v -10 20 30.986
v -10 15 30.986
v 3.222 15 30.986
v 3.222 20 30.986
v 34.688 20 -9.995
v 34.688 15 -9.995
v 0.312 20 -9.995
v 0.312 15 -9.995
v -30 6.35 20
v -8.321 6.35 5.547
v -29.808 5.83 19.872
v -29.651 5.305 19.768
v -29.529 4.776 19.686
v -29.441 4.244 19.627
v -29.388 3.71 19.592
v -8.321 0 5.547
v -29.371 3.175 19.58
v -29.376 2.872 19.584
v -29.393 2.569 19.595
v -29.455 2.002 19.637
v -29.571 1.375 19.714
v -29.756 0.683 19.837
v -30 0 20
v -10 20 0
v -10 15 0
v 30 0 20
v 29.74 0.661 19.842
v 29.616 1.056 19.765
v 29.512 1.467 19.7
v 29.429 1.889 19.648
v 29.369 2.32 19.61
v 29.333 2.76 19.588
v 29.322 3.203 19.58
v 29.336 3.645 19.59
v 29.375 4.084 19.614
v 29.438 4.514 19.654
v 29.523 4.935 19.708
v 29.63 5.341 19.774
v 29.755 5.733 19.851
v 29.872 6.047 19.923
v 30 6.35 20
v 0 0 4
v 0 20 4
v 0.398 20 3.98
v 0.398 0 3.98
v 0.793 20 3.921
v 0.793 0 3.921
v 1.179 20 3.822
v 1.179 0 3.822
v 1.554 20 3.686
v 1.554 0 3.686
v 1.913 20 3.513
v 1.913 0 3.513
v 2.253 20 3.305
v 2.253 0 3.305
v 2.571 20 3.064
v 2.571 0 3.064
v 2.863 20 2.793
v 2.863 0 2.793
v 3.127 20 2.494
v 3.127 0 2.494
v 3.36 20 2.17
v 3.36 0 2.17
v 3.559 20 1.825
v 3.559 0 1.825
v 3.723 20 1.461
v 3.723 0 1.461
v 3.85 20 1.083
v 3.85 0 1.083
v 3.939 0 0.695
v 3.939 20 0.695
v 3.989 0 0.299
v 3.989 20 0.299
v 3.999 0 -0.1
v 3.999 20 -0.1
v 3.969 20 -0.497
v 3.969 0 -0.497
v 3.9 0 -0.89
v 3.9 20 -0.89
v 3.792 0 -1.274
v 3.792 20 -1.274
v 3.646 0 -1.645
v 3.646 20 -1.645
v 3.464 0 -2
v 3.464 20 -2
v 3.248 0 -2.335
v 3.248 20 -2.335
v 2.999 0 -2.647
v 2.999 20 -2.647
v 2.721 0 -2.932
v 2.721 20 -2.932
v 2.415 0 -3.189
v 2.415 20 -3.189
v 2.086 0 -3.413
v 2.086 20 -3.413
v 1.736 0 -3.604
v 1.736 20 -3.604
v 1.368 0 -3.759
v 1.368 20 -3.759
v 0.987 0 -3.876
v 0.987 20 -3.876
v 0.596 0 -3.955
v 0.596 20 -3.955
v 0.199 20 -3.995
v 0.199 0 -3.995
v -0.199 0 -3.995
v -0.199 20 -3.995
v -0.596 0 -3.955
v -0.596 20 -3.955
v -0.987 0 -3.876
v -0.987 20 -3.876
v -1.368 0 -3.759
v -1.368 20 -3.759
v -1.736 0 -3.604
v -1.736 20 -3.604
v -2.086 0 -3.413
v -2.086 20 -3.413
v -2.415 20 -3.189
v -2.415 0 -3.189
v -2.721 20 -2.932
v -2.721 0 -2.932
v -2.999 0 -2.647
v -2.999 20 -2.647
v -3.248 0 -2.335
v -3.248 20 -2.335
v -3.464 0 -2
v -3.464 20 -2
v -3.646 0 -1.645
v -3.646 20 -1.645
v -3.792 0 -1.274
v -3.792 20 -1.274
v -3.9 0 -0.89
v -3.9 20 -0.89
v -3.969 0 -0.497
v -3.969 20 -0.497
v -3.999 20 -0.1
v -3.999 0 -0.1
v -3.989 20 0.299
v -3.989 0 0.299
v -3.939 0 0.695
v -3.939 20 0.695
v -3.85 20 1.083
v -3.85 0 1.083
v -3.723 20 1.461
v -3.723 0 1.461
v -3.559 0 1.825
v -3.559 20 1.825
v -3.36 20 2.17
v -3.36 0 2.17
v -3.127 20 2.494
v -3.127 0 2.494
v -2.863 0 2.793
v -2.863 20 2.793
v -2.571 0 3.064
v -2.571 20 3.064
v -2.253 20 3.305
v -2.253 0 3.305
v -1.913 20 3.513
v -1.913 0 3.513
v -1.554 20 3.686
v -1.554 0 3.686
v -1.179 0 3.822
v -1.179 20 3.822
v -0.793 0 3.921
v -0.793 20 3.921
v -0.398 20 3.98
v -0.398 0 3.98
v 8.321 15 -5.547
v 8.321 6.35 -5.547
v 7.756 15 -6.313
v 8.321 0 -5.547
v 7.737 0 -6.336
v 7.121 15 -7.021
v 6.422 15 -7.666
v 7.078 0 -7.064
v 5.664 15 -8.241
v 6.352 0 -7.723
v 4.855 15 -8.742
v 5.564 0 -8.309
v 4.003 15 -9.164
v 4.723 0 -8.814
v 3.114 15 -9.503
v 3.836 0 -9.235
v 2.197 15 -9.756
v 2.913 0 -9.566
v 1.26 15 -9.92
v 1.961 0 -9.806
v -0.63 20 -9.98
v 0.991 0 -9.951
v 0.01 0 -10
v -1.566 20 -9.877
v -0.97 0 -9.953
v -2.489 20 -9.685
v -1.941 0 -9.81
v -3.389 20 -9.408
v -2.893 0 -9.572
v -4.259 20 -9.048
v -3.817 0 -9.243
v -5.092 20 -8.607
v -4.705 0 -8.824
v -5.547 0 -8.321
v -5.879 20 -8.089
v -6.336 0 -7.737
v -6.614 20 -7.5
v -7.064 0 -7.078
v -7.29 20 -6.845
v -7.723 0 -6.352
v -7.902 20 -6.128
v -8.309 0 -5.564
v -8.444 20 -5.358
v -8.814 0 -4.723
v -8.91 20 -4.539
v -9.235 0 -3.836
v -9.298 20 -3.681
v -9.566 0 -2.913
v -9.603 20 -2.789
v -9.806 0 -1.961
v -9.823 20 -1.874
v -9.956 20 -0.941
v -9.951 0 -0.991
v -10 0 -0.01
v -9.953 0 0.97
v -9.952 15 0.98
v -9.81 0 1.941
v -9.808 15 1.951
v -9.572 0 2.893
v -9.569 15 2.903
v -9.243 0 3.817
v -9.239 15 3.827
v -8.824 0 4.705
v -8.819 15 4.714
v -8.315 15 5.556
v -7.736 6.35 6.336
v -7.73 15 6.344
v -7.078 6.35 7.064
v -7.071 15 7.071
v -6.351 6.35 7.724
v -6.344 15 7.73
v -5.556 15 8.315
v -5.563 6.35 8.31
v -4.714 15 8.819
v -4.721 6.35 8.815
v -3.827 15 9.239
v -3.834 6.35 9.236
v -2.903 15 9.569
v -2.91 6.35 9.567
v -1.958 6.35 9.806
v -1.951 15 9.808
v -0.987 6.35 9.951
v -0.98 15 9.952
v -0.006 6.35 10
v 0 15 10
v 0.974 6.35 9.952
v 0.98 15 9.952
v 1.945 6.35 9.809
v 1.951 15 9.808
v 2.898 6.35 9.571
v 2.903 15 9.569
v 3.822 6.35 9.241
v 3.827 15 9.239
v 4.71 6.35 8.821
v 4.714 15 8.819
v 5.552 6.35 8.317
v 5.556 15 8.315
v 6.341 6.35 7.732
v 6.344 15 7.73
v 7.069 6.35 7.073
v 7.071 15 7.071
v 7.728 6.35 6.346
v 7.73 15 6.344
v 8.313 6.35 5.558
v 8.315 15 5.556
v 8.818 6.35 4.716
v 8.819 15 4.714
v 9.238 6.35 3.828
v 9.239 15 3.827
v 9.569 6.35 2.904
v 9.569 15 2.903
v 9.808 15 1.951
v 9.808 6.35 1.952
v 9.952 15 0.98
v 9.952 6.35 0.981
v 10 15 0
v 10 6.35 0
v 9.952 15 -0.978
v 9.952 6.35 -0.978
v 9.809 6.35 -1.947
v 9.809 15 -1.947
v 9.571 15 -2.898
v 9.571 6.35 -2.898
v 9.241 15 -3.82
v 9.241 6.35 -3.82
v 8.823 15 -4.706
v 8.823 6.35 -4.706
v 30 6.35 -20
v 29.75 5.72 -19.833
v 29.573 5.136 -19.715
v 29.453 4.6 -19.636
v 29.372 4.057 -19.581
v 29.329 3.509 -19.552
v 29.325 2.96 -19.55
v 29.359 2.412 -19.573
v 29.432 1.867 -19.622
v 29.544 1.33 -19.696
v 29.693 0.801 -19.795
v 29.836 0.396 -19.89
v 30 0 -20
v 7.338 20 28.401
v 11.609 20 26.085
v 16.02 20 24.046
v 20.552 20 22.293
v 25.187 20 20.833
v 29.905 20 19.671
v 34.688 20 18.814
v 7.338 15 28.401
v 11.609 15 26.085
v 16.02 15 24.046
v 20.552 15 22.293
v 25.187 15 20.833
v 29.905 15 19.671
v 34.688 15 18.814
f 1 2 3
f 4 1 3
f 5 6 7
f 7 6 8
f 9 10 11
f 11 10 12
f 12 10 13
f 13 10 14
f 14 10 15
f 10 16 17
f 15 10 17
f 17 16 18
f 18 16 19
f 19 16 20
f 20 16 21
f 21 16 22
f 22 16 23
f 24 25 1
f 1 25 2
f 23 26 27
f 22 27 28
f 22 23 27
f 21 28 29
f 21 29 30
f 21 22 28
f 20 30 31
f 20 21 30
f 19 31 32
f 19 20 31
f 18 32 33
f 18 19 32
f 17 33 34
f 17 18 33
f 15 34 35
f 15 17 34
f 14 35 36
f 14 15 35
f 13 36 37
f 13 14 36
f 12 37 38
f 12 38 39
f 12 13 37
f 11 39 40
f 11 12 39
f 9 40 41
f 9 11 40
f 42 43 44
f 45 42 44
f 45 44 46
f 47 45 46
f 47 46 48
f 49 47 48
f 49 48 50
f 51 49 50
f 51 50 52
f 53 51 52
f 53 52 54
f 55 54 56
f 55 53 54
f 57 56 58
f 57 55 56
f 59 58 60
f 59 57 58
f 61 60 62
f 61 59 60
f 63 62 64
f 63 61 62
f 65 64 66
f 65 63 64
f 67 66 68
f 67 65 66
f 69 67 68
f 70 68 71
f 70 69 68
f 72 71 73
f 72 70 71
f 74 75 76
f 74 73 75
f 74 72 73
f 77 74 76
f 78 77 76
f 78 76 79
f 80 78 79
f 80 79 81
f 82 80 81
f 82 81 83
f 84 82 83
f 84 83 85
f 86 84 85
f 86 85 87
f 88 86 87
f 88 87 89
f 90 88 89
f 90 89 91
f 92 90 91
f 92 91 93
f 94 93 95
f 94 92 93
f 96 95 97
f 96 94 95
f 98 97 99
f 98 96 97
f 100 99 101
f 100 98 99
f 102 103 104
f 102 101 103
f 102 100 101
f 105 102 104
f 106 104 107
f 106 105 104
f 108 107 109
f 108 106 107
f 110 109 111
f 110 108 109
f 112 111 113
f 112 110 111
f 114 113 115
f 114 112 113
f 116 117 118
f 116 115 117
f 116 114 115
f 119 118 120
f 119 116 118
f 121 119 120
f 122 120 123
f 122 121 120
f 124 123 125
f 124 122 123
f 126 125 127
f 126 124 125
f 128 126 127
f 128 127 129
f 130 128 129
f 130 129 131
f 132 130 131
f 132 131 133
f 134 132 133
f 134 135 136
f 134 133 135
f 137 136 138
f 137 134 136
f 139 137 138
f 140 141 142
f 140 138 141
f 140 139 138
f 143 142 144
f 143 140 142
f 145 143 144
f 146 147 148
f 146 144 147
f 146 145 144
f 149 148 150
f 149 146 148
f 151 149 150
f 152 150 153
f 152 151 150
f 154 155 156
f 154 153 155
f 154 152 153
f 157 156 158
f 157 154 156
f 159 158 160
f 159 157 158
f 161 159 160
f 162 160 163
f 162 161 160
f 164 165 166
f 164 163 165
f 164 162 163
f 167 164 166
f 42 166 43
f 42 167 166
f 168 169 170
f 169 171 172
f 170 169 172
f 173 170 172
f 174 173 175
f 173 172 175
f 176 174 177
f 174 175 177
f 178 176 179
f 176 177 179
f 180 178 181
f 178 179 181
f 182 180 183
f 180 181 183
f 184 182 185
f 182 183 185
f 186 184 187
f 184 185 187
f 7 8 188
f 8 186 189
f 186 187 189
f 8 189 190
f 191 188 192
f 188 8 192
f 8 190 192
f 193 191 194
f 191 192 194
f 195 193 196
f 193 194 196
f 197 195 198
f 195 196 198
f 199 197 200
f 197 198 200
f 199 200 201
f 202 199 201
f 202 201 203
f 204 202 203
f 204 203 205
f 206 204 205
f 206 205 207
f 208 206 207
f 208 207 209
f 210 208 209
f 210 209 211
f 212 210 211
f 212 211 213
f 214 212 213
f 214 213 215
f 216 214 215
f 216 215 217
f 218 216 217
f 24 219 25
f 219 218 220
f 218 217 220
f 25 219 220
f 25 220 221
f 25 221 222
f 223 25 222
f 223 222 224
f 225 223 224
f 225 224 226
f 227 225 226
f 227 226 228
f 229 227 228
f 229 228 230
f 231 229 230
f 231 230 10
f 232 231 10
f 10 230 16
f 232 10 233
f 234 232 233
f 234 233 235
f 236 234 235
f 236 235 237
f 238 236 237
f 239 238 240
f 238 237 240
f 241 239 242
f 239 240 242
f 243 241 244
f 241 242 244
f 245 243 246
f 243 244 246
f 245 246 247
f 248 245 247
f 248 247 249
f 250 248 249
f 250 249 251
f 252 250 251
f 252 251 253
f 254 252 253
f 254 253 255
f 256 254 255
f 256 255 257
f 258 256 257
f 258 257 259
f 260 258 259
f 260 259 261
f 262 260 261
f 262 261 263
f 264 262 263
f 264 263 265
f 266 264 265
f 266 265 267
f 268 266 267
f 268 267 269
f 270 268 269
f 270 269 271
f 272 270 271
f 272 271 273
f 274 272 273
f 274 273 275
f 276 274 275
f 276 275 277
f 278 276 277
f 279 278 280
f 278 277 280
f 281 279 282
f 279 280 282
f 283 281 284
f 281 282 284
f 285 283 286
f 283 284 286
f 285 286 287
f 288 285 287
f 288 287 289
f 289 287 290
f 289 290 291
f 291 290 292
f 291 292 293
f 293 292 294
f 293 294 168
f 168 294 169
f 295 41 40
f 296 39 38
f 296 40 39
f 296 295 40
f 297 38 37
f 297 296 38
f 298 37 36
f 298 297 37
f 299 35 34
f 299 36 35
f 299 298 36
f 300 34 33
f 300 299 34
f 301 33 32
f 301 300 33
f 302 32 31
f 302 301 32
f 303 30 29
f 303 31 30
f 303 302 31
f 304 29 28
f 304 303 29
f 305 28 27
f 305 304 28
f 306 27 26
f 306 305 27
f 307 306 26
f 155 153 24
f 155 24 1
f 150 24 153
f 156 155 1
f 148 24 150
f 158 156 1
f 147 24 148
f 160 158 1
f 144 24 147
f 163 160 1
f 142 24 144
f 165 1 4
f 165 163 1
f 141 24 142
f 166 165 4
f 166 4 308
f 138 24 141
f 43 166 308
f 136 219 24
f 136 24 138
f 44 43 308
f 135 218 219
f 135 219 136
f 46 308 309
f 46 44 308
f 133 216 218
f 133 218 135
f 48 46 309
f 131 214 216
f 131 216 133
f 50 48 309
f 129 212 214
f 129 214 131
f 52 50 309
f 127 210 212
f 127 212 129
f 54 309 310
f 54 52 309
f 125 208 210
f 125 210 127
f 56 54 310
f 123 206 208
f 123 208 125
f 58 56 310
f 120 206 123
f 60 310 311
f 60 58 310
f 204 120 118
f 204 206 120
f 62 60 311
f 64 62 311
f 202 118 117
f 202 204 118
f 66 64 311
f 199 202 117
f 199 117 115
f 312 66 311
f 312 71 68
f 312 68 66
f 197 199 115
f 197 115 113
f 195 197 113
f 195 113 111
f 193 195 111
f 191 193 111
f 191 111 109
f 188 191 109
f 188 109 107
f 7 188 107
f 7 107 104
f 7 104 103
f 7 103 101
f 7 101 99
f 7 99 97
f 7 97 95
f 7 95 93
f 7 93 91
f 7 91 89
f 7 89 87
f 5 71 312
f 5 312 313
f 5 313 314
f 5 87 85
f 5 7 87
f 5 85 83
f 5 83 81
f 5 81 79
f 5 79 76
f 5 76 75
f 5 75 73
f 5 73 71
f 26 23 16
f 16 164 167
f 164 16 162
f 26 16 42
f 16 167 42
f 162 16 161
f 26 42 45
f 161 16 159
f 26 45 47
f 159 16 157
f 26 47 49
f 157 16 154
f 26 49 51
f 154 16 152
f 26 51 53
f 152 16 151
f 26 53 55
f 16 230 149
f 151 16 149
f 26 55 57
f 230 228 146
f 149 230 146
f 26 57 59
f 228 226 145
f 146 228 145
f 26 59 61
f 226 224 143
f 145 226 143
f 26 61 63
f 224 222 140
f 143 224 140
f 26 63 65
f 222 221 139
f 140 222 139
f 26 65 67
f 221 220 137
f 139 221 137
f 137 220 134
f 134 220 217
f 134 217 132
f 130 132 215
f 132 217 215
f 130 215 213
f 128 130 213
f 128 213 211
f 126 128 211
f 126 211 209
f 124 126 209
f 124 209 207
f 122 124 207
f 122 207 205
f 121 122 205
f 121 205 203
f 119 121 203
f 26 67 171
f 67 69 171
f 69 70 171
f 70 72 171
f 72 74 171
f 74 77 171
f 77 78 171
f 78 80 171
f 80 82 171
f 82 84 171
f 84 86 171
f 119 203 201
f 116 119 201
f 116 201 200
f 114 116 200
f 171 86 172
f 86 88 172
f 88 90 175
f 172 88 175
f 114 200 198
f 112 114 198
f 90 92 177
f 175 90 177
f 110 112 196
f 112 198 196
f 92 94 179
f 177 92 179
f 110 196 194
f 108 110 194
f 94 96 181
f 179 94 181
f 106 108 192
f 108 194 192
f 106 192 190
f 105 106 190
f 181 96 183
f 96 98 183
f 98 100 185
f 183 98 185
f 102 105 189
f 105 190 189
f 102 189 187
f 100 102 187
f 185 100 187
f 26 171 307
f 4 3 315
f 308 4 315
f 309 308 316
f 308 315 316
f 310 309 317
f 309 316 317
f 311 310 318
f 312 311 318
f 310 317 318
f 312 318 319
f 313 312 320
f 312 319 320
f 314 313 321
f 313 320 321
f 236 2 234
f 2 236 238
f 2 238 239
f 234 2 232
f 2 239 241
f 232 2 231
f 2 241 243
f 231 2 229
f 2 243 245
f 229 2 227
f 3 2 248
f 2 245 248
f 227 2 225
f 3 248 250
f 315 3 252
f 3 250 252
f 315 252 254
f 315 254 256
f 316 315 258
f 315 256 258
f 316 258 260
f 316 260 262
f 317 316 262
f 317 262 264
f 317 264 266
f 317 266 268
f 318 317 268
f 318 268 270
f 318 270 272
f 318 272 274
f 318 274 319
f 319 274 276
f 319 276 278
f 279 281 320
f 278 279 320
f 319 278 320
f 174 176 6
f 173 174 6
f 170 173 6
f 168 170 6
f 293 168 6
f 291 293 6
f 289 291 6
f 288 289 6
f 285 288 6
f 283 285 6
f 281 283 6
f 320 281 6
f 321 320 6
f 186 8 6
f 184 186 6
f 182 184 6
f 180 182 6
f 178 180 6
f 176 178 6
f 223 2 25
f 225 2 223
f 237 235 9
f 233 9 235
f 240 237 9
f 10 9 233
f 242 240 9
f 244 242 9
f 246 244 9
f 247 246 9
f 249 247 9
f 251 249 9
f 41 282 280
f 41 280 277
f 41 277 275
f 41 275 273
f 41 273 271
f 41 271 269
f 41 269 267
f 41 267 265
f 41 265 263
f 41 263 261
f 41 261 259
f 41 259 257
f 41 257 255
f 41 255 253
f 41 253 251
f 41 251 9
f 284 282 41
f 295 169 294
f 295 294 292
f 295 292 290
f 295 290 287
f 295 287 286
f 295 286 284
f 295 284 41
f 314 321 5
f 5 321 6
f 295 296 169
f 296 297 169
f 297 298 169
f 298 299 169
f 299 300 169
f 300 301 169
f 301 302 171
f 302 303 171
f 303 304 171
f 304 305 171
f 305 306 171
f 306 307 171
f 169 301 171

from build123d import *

# Parameters (mm, degrees)
BOSS_EXTRUDE1_DEPTH     = 6.35
SKETCH1_3_R             = 10
SKETCH1_3_R_2           = 4
BOSS_EXTRUDE2_DEPTH     = 20
CUT_EXTRUDE1_DEPTH      = 42.231056256
CUT_EXTRUDE1_DEPTH_BACK = 42.231056256
SKETCH3_R               = 7.768492306
CUT_EXTRUDE3_DEPTH      = 42.231056256
CUT_EXTRUDE3_DEPTH_BACK = 42.231056256
SKETCH4_R               = 12.223418735
BOSS_EXTRUDE3_START     = -5
BOSS_EXTRUDE3_DEPTH     = 5


with BuildPart() as part:
    # Sketch1 → Boss-Extrude1 (new body)
    with BuildSketch(Plane(origin=(0, 0, 0), x_dir=(1, 0, 0), z_dir=(0, 1, 0))):
        with BuildLine():
            Line((30, -20), (30, 20))
            Line((30, 20), (8.320502943, 5.547001962))
            ThreePointArc((8.320502943, 5.547001962), (9.570920265, 2.897841487), (10, 0))
            ThreePointArc((10, 0), (2.897841487, -9.570920265), (-8.320502943, -5.547001962))
            Line((-8.320502943, -5.547001962), (-30, -20))
            Line((-30, -20), (30, -20))
        make_face()
    extrude(amount=BOSS_EXTRUDE1_DEPTH)

    # Sketch1<3> → Boss-Extrude2 (add)
    # profile 1 of 3: a face of its own
    with BuildSketch(Plane(origin=(0, 0, 0), x_dir=(1, 0, 0), z_dir=(0, 1, 0))):
        with Locations(Location((0, 0, 0), (0, 0, 33.690067526))):
            Circle(SKETCH1_3_R)
        with Locations(Location((0, 0, 0), (0, 0, 270))):
            Circle(SKETCH1_3_R_2, mode=Mode.SUBTRACT)
    # profile 2 of 3: a face of its own
    with BuildSketch(Plane(origin=(0, 0, 0), x_dir=(1, 0, 0), z_dir=(0, 1, 0))):
        with BuildLine():
            ThreePointArc((10, 0), (9.570920265, 2.897841487), (8.320502943, 5.547001962))
            Line((8.320502943, 5.547001962), (3.328201177, 2.218800785))
            ThreePointArc((3.328201177, 2.218800785), (3.828368106, 1.159136595), (4, 0))
            ThreePointArc((4, 0), (1.159136595, -3.828368106), (-3.328201177, -2.218800785))
            Line((-3.328201177, -2.218800785), (-8.320502943, -5.547001962))
            ThreePointArc((-8.320502943, -5.547001962), (2.897841487, -9.570920265), (10, 0))
        make_face()
    # profile 3 of 3: a face of its own
    with BuildSketch(Plane(origin=(0, 0, 0), x_dir=(1, 0, 0), z_dir=(0, 1, 0))):
        with BuildLine():
            Line((3.328201177, 2.218800785), (8.320502943, 5.547001962))
            ThreePointArc((8.320502943, 5.547001962), (-5.547001962, 8.320502943), (-8.320502943, -5.547001962))
            Line((-8.320502943, -5.547001962), (-3.328201177, -2.218800785))
            ThreePointArc((-3.328201177, -2.218800785), (-2.218800785, 3.328201177), (3.328201177, 2.218800785))
        make_face()
    extrude(amount=BOSS_EXTRUDE2_DEPTH)

    # Sketch3 → Cut-Extrude1 (cut, two sides: drawn at the far end of the back side and taken through both)
    with BuildSketch(Plane.XY.offset(-CUT_EXTRUDE1_DEPTH_BACK)):
        with Locations((37.090052729, 3.175)):
            Circle(SKETCH3_R)
    extrude(amount=CUT_EXTRUDE1_DEPTH + CUT_EXTRUDE1_DEPTH_BACK, mode=Mode.SUBTRACT)

    # Sketch4 → Cut-Extrude3 (cut, two sides: drawn at the far end of the back side and taken through both)
    with BuildSketch(Plane(origin=(0, 0, 0), x_dir=(0, 0, -1), z_dir=(1, 0, 0)).offset(-CUT_EXTRUDE3_DEPTH_BACK)):
        with Locations((-31.803869729, 3.175)):
            Circle(SKETCH4_R)
    extrude(amount=CUT_EXTRUDE3_DEPTH + CUT_EXTRUDE3_DEPTH_BACK, mode=Mode.SUBTRACT)

    # Sketch5 → Boss-Extrude3 (add)
    with BuildSketch(Plane(origin=(0, 20, 0), x_dir=(1, 0, 0), z_dir=(0, 1, 0)).offset(BOSS_EXTRUDE3_START)):
        with BuildLine():
            Line((34.688363183, 9.995142945), (0.311636817, 9.995142945))
            ThreePointArc((0.311636817, 9.995142945), (7.18040278, 6.960015511), (10, 0))
            ThreePointArc((10, 0), (0, -10), (-10, 0))
            Line((-10, 0), (-10, -30.985714007))
            Line((-10, -30.985714007), (3.222370876, -30.985714007))
            ThreePointArc((3.222370876, -30.985714007), (18.272166371, -23.133524369), (34.688363183, -18.813604371))
            Line((34.688363183, -18.813604371), (34.688363183, 9.995142945))
        make_face()
    extrude(amount=BOSS_EXTRUDE3_DEPTH)


solid = part.part
